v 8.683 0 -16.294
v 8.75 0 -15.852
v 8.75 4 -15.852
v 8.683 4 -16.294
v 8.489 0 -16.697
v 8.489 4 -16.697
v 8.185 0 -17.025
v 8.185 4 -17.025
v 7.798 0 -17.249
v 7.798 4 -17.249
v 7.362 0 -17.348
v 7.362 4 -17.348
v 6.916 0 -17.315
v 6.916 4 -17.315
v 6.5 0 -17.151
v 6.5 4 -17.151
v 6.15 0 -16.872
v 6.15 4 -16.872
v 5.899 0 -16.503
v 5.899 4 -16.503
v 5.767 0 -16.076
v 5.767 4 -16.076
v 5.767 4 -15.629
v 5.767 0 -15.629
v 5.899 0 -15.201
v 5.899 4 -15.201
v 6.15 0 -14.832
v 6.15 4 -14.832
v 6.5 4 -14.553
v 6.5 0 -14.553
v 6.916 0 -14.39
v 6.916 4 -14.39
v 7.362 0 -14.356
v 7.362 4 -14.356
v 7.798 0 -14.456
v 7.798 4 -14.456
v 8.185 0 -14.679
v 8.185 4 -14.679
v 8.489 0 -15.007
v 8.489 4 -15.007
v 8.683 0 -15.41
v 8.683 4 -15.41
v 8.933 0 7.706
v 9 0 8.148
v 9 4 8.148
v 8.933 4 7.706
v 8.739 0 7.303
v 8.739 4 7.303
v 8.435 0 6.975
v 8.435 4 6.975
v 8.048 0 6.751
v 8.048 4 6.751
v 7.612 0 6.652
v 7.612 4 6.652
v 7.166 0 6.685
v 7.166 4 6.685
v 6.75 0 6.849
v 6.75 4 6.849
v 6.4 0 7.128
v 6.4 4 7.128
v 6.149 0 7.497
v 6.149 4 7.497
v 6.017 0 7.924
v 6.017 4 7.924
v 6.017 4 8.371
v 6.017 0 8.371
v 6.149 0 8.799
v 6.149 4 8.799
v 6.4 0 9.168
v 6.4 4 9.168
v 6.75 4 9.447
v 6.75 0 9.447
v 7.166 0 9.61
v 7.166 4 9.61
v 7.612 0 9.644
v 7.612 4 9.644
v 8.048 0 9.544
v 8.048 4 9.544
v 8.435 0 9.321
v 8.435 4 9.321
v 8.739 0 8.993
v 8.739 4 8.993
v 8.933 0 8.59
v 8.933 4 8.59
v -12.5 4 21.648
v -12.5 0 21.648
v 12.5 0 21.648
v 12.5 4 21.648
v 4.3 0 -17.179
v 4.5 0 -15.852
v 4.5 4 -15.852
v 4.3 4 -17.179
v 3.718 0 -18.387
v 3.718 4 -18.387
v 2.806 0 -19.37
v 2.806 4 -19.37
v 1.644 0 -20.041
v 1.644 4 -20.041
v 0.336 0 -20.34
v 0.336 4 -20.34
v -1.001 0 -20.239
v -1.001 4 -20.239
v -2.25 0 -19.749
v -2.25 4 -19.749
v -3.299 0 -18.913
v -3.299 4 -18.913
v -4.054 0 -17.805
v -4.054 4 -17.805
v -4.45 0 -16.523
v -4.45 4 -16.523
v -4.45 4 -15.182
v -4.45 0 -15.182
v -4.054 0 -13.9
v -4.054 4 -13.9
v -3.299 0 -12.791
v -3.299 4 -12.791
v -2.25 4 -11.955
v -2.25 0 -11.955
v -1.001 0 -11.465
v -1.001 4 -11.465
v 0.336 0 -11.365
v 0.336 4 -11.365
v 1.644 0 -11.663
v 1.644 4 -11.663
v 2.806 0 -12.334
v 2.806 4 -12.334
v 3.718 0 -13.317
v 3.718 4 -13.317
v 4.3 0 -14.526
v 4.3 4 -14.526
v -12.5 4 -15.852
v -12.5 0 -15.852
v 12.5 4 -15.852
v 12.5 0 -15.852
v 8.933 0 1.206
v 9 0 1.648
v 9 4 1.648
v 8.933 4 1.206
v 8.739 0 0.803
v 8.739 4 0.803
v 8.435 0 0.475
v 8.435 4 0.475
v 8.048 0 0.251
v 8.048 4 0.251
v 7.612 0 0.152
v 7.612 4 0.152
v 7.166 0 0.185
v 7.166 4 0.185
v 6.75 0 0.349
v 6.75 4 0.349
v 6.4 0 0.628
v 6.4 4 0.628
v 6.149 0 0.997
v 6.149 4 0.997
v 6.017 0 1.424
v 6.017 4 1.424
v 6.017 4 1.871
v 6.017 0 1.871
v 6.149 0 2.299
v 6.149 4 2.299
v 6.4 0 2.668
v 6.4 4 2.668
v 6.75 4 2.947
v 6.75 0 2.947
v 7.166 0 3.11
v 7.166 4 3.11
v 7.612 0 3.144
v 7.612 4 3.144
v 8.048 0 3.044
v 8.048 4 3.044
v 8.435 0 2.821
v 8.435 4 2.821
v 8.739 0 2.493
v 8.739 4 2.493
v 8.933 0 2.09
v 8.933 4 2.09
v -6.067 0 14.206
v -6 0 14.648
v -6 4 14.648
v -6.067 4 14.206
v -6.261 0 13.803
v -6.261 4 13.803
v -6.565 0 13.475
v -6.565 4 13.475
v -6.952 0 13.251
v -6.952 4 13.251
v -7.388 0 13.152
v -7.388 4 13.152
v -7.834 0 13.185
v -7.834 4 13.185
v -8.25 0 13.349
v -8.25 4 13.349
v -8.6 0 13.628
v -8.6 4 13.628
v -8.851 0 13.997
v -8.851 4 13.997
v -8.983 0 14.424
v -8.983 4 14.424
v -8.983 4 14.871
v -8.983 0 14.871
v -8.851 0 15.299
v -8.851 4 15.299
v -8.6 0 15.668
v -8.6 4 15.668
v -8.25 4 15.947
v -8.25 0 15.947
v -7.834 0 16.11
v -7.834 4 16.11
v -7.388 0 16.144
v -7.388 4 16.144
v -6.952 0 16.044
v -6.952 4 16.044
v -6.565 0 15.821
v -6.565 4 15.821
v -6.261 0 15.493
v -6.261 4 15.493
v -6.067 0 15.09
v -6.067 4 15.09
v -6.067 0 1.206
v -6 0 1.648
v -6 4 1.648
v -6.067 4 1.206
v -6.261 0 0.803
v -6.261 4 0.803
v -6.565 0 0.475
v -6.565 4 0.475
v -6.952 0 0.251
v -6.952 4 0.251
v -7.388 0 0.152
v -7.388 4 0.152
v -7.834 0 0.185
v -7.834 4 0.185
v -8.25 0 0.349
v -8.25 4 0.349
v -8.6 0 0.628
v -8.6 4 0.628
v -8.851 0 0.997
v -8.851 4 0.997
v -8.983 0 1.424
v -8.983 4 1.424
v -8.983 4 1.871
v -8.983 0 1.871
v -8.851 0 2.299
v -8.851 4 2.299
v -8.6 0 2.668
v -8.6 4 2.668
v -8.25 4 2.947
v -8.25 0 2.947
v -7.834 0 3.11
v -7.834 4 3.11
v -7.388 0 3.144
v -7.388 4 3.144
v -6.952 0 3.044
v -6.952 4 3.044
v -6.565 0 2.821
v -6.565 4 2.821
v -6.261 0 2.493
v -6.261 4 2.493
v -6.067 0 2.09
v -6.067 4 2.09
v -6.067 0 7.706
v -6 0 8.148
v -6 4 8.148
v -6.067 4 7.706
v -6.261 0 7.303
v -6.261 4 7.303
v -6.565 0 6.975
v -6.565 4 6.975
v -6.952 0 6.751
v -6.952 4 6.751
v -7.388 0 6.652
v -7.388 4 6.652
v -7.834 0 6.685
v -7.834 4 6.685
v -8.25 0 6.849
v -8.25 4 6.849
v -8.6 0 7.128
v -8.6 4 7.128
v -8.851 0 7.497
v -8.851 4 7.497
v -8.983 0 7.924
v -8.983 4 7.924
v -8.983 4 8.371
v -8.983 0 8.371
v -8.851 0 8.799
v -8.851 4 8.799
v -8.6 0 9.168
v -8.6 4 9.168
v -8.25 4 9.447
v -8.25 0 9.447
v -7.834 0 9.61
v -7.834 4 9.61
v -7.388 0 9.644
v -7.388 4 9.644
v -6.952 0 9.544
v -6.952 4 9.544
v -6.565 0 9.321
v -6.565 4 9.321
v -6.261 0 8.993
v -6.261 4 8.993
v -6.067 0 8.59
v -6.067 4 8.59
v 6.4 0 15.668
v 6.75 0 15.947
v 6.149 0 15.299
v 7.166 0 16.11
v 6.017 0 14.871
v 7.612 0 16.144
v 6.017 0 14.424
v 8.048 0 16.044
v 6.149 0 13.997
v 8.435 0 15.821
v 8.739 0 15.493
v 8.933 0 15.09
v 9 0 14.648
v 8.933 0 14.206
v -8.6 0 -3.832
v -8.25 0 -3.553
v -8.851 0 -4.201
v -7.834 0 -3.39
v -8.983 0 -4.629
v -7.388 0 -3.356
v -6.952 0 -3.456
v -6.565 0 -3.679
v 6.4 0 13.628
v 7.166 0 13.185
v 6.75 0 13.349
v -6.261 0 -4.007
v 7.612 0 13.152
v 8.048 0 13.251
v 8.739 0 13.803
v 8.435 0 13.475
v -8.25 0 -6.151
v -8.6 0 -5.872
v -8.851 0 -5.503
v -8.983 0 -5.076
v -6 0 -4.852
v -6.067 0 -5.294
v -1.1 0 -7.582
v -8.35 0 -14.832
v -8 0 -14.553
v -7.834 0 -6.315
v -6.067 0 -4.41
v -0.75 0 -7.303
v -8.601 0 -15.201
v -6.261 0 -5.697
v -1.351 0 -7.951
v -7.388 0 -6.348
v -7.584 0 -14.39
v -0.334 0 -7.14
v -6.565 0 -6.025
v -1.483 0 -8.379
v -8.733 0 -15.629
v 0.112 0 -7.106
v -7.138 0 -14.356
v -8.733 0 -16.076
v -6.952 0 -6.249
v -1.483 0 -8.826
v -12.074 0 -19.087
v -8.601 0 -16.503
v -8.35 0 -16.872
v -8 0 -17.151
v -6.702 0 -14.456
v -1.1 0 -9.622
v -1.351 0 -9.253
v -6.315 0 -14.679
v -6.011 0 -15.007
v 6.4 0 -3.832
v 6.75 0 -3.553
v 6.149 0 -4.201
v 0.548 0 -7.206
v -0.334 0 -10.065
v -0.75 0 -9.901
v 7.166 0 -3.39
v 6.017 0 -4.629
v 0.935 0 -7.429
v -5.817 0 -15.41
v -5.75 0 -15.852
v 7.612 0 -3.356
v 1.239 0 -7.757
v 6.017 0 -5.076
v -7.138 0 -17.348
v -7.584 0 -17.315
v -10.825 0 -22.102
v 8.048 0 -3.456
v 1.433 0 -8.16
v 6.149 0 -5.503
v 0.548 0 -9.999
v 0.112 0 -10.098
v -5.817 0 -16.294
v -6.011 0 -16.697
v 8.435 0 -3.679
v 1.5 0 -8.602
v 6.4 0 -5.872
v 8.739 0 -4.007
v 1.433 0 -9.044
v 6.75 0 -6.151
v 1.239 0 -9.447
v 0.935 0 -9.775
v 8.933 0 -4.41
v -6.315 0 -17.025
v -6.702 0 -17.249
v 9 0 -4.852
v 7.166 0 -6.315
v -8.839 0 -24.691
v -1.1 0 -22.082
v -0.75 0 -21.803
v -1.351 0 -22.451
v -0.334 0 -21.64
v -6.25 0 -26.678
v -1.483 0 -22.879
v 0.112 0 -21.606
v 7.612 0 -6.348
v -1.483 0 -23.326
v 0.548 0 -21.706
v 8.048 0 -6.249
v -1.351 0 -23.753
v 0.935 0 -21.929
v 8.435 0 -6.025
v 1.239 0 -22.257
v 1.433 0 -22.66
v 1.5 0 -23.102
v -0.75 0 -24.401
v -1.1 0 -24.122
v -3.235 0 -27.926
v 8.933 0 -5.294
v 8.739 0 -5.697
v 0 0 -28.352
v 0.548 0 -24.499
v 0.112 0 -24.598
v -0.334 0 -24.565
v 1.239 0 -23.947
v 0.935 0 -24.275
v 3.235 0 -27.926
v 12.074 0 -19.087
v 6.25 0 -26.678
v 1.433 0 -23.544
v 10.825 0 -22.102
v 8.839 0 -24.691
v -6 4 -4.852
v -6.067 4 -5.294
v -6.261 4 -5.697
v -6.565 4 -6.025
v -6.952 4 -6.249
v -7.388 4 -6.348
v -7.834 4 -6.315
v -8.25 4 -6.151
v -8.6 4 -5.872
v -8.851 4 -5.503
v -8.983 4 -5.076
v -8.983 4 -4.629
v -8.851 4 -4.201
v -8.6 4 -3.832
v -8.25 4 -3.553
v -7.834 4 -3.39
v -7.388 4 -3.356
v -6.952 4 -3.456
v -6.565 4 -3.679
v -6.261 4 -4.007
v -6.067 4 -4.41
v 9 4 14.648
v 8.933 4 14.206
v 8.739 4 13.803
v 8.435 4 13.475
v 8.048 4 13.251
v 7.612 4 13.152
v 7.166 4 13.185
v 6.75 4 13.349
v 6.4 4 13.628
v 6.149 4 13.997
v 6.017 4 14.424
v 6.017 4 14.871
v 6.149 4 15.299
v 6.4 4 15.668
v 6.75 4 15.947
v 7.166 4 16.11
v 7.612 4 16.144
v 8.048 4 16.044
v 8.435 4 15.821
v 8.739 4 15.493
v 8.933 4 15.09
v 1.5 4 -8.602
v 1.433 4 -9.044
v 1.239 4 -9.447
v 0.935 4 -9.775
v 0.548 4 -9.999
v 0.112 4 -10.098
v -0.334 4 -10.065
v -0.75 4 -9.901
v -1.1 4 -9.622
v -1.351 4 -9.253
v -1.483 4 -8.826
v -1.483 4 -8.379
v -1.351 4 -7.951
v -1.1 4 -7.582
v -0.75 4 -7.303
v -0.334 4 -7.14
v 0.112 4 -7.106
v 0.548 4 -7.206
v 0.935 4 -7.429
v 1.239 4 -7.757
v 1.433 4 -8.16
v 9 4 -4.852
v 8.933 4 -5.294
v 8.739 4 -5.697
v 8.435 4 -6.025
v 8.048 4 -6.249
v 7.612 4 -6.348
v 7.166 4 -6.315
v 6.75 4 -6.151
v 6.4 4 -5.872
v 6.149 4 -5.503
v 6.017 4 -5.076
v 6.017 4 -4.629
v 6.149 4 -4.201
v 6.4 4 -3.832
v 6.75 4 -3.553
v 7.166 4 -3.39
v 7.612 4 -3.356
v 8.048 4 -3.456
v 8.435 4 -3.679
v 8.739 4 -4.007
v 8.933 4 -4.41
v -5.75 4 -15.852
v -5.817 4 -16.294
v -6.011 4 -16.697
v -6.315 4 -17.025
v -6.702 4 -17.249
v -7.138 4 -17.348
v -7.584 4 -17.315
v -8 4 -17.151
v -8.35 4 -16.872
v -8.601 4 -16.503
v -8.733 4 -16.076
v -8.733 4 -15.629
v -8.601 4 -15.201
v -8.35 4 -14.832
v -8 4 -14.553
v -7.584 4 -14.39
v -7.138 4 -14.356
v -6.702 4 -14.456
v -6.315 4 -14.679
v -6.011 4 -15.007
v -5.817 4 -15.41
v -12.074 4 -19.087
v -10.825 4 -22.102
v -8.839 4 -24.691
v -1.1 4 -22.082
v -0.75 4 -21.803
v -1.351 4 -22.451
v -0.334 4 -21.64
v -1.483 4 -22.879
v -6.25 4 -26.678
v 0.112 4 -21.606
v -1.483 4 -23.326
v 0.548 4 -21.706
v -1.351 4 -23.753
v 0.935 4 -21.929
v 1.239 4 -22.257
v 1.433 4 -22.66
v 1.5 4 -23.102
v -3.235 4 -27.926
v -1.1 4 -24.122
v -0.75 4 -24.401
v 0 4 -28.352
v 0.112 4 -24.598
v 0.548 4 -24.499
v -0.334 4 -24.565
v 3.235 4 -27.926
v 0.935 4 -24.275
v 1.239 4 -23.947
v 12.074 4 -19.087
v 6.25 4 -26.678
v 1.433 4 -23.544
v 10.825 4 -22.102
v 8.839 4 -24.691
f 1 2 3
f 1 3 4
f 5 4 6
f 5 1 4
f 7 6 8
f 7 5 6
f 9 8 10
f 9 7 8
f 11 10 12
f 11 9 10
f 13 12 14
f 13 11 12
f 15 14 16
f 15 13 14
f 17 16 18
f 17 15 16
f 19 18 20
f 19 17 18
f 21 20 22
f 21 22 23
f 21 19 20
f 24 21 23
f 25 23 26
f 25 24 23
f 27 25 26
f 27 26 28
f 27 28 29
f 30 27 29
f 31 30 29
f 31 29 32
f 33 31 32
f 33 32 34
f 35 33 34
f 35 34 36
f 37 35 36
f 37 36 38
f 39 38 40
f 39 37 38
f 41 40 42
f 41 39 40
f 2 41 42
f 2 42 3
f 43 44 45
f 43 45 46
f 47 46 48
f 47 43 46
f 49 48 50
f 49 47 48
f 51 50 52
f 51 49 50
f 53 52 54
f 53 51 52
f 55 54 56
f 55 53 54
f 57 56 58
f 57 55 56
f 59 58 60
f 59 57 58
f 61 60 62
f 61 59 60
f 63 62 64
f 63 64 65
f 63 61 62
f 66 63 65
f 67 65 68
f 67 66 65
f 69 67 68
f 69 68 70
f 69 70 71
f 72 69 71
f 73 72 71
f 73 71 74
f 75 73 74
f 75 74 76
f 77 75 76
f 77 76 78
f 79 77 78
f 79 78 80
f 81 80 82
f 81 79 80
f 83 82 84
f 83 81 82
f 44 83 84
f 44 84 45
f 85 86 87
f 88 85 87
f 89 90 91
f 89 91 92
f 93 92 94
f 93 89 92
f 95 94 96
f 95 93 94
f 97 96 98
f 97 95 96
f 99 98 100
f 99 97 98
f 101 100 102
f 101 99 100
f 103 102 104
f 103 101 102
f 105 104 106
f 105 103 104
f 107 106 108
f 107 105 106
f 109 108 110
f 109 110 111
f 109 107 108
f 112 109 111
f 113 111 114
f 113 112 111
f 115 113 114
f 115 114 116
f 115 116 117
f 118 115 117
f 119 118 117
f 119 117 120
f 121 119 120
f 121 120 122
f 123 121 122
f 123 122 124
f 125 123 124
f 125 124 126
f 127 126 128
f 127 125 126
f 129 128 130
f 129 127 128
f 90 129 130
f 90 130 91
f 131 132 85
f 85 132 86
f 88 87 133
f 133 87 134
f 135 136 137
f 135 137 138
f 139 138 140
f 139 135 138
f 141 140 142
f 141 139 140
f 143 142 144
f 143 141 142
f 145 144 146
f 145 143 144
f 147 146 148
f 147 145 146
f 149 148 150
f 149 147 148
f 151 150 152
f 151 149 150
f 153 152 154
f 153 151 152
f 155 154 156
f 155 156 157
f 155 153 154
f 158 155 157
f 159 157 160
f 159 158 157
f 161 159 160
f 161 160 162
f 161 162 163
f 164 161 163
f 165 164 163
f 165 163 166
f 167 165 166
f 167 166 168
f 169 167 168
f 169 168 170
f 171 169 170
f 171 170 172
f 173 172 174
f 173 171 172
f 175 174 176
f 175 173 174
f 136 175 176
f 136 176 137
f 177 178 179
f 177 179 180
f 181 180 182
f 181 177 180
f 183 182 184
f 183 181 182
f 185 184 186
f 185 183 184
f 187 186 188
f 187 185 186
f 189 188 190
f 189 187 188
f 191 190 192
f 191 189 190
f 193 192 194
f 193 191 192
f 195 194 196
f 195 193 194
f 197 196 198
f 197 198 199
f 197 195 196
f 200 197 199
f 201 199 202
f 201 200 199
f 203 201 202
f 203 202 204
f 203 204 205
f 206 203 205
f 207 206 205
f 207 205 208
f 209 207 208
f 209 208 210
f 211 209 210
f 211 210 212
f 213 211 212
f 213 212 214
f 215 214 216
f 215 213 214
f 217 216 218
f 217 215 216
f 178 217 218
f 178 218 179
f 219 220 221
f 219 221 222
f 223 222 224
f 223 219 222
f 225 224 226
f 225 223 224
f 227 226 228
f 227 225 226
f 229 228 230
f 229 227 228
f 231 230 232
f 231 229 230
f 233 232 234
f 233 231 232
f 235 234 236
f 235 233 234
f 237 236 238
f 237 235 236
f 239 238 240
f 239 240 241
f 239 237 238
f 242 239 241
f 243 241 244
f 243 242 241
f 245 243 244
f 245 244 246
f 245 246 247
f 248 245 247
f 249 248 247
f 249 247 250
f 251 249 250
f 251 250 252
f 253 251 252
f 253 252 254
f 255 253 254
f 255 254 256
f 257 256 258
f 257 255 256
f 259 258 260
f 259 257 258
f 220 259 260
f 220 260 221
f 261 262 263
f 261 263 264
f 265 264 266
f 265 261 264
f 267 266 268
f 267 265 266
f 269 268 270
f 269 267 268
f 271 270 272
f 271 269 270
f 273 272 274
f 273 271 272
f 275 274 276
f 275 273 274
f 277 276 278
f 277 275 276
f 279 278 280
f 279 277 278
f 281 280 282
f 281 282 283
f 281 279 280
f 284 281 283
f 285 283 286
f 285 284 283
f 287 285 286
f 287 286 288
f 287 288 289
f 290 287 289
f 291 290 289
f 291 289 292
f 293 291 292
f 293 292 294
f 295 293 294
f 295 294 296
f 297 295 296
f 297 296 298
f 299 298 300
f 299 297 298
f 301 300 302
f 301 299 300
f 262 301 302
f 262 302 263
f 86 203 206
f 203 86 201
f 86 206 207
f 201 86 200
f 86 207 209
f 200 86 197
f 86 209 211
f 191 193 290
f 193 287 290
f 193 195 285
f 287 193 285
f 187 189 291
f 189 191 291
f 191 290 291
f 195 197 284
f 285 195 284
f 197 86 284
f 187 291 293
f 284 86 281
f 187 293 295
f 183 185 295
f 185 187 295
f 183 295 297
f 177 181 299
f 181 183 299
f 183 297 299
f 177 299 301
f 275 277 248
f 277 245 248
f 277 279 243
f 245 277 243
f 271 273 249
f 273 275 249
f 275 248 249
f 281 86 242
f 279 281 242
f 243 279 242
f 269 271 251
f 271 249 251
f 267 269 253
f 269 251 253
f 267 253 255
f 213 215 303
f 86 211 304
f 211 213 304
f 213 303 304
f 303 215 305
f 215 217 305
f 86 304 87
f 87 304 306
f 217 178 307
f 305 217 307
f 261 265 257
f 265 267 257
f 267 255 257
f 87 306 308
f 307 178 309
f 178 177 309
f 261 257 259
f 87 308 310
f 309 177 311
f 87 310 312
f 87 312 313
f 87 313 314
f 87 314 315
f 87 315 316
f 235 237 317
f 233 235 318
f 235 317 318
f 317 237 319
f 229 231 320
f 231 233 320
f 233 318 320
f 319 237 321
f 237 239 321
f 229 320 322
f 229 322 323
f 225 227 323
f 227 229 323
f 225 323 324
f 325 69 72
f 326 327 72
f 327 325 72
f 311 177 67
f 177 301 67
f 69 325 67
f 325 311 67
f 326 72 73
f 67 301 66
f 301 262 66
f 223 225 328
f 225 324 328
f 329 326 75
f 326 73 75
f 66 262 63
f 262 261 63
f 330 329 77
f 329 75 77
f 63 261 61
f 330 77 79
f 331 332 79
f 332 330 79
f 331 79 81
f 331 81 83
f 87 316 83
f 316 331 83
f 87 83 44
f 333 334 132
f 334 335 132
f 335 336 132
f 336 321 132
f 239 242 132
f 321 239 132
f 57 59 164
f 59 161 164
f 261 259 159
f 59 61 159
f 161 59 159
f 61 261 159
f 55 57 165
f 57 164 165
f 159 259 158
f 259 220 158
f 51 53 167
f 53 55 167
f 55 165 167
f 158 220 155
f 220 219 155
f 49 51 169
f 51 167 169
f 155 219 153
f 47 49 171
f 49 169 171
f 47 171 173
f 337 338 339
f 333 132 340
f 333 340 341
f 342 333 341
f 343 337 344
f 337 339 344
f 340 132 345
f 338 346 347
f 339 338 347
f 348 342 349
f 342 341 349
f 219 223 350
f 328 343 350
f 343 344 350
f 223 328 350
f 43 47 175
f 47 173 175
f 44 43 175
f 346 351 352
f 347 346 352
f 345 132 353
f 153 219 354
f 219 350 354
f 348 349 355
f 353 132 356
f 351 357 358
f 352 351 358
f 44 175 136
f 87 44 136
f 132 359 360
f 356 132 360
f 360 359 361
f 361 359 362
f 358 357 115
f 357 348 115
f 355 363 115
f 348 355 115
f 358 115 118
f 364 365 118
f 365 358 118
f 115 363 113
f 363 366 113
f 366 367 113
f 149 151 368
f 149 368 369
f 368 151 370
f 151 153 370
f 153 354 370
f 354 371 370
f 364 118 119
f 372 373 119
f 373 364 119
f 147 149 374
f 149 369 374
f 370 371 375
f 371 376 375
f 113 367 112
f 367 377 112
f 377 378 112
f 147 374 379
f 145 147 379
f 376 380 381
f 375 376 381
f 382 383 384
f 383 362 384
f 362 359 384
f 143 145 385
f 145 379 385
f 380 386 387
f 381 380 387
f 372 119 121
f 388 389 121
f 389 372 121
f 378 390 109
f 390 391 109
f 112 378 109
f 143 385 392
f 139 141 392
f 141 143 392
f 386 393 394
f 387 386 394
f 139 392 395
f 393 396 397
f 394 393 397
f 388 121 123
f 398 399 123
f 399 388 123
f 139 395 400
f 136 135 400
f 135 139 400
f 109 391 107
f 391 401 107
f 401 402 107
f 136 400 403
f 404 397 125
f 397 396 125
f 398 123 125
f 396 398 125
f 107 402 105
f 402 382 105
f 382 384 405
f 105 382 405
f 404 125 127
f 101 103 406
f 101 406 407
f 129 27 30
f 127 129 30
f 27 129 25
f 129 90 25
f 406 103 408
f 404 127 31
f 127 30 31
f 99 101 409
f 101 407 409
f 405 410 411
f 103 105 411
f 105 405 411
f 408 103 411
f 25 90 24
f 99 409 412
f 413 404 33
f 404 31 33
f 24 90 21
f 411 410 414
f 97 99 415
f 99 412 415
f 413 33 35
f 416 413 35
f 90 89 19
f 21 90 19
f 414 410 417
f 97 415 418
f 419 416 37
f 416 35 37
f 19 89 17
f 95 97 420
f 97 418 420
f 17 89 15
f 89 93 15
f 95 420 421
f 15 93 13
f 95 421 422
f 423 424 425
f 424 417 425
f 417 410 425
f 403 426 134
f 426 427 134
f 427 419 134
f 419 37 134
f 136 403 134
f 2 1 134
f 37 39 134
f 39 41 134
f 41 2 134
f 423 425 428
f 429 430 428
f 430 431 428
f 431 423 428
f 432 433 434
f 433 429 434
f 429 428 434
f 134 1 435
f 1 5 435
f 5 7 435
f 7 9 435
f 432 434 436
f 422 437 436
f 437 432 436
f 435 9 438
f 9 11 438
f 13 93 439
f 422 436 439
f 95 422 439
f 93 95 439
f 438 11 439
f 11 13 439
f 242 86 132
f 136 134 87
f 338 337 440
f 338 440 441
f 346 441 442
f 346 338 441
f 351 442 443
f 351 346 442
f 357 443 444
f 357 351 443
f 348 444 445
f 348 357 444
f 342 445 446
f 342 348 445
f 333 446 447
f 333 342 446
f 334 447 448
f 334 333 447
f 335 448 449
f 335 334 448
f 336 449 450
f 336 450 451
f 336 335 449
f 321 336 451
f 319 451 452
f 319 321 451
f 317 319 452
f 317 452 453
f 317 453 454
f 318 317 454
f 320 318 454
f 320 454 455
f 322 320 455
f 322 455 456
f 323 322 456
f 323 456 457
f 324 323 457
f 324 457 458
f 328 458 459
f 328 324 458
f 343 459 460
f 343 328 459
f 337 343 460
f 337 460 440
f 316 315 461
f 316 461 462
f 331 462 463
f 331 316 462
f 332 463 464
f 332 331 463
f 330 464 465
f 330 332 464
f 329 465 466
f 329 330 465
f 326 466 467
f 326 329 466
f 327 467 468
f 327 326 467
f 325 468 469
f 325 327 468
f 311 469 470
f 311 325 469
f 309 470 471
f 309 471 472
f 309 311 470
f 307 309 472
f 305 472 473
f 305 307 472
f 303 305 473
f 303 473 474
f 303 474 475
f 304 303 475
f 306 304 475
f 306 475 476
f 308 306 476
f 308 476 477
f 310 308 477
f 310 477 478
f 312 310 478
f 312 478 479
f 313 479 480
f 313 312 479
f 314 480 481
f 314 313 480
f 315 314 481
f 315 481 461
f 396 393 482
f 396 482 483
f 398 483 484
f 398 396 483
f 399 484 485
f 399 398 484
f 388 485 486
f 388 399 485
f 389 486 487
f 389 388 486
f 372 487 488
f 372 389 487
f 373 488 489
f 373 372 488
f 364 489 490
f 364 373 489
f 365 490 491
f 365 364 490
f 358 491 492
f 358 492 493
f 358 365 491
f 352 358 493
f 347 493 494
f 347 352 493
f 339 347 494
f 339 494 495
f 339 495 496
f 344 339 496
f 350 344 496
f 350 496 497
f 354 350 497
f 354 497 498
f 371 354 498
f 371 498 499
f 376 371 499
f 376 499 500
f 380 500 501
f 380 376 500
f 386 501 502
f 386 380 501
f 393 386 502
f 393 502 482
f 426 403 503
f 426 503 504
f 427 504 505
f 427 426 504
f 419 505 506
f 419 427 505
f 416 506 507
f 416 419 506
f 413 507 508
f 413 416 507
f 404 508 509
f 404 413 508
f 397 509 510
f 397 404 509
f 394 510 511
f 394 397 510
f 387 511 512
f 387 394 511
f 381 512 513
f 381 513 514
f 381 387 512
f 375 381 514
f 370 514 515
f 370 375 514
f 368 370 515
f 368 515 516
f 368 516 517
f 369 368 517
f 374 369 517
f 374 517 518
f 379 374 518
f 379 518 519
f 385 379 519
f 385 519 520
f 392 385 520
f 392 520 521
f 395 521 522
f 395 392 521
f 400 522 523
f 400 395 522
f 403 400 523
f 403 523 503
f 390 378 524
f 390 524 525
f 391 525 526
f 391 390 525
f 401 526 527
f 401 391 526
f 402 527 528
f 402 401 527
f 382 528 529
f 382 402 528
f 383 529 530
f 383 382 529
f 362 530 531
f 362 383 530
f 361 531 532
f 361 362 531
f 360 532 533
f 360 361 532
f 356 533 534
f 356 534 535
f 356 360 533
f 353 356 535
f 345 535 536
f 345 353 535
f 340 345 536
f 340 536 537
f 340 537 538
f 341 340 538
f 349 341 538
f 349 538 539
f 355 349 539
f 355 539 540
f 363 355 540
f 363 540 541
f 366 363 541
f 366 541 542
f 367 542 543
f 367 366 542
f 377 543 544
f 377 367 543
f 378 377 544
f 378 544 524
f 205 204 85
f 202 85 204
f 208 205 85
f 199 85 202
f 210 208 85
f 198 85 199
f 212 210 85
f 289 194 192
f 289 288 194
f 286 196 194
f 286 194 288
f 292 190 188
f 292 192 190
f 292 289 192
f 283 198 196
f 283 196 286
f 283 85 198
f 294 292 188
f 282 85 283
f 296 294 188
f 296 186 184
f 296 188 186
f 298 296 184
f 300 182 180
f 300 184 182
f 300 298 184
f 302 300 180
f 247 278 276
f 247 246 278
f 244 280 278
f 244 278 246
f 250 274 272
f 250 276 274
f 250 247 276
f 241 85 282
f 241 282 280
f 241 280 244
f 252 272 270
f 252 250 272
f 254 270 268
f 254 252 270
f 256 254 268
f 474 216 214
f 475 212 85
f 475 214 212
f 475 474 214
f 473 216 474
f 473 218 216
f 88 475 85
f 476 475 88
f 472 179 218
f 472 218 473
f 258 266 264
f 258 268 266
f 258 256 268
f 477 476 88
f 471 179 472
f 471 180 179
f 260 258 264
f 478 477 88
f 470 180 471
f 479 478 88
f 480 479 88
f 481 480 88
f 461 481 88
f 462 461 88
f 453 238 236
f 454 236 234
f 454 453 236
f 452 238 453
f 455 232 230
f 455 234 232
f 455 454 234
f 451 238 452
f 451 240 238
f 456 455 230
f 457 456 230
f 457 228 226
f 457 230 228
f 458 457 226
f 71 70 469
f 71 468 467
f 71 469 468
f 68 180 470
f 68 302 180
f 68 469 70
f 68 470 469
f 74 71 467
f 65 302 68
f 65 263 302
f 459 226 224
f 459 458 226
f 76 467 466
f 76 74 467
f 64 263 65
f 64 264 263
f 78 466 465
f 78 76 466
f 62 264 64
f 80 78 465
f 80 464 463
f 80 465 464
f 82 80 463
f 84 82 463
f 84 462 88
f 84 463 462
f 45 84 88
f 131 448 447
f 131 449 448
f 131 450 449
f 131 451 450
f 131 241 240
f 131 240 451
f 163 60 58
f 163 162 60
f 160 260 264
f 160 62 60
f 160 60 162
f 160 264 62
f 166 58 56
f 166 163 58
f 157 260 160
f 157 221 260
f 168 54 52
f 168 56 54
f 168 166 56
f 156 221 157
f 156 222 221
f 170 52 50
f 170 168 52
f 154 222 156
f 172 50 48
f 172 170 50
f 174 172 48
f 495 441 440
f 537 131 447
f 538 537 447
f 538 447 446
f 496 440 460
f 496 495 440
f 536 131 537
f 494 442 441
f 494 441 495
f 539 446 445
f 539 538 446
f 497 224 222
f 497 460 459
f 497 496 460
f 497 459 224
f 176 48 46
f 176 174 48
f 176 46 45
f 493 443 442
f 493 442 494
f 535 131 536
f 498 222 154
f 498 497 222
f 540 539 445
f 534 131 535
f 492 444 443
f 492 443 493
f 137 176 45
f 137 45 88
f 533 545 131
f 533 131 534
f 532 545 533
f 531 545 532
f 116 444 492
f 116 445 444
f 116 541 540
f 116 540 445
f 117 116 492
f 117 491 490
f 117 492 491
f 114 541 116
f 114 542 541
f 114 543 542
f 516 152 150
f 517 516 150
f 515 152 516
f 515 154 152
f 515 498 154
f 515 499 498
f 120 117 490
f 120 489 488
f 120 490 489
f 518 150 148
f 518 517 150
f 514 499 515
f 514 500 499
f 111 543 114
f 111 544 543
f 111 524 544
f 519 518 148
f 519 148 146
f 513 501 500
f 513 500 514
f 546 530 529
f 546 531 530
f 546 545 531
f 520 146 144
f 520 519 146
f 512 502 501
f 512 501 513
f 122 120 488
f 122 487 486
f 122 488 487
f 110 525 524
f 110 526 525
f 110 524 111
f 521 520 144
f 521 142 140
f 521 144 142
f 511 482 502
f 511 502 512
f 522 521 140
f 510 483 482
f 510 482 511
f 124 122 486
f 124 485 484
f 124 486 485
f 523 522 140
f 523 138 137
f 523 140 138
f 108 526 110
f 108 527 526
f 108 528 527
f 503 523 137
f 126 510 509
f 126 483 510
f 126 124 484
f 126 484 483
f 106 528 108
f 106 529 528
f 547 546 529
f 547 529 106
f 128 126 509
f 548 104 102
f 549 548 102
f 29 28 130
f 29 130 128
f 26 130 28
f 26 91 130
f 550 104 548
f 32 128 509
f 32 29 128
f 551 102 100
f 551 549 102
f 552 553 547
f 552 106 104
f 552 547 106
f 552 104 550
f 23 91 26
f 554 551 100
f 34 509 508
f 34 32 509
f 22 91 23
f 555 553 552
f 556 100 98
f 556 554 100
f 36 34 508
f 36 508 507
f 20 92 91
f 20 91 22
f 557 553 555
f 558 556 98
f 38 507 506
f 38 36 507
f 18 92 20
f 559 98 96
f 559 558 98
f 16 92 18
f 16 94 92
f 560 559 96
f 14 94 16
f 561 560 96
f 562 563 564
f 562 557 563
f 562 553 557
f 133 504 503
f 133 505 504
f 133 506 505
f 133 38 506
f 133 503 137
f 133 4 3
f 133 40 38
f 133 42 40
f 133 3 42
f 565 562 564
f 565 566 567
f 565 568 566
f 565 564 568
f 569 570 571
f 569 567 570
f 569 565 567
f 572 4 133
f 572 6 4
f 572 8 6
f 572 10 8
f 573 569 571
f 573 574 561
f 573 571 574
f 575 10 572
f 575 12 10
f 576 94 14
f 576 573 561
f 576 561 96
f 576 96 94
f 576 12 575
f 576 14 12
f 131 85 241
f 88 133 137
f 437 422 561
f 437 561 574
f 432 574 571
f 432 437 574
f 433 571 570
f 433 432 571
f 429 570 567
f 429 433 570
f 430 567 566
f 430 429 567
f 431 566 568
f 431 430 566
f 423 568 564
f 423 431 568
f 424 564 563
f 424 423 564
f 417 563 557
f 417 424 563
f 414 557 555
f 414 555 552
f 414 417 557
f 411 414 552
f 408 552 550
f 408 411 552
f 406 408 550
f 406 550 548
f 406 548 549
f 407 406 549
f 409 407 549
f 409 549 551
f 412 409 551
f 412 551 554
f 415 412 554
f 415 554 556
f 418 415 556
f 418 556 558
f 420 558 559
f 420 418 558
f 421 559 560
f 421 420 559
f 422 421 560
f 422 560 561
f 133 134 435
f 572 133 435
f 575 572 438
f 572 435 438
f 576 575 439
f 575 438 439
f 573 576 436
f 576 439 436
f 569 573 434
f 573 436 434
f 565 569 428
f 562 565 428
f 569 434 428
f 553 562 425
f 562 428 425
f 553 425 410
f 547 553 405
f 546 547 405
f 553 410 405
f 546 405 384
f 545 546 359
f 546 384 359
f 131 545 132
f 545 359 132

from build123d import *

# Parameters (mm, degrees)
SKETCH_1_R      = 4.5
SKETCH_1_R_2    = 1.5
EXTRUDE_1_DEPTH = 4


with BuildPart() as part:
    # Эскиз1 → Бобышка-Вытянуть1 (new body)
    with BuildSketch(Plane(origin=(0, 0, 0), x_dir=(1, 0, 0), z_dir=(0, 1, 0))):
        with BuildLine():
            Line((-12.5, 15.852233677), (-12.5, -21.647766323))
            Line((-12.5, -21.647766323), (12.5, -21.647766323))
            Line((12.5, -21.647766323), (12.5, 15.852233677))
            ThreePointArc((12.5, 15.852233677), (0, 28.352233677), (-12.5, 15.852233677))
        make_face()
        with Locations((0, 15.852233677)):
            Circle(SKETCH_1_R, mode=Mode.SUBTRACT)
        with Locations((-7.5, -14.647766323)):
            Circle(SKETCH_1_R_2, mode=Mode.SUBTRACT)
        with Locations((7.5, -14.647766323)):
            Circle(SKETCH_1_R_2, mode=Mode.SUBTRACT)
        with Locations((-7.5, -8.147766323)):
            Circle(SKETCH_1_R_2, mode=Mode.SUBTRACT)
        with Locations((7.5, -8.147766323)):
            Circle(SKETCH_1_R_2, mode=Mode.SUBTRACT)
        with Locations((-7.5, -1.647766323)):
            Circle(SKETCH_1_R_2, mode=Mode.SUBTRACT)
        with Locations((7.5, -1.647766323)):
            Circle(SKETCH_1_R_2, mode=Mode.SUBTRACT)
        with Locations((-7.5, 4.852233677)):
            Circle(SKETCH_1_R_2, mode=Mode.SUBTRACT)
        with Locations((7.5, 4.852233677)):
            Circle(SKETCH_1_R_2, mode=Mode.SUBTRACT)
        with Locations((0, 23.102233677)):
            Circle(SKETCH_1_R_2, mode=Mode.SUBTRACT)
        with Locations((7.25, 15.852233677)):
            Circle(SKETCH_1_R_2, mode=Mode.SUBTRACT)
        with Locations((0, 8.602233677)):
            Circle(SKETCH_1_R_2, mode=Mode.SUBTRACT)
        with Locations((-7.25, 15.852233677)):
            Circle(SKETCH_1_R_2, mode=Mode.SUBTRACT)
    extrude(amount=EXTRUDE_1_DEPTH)


solid = part.part
